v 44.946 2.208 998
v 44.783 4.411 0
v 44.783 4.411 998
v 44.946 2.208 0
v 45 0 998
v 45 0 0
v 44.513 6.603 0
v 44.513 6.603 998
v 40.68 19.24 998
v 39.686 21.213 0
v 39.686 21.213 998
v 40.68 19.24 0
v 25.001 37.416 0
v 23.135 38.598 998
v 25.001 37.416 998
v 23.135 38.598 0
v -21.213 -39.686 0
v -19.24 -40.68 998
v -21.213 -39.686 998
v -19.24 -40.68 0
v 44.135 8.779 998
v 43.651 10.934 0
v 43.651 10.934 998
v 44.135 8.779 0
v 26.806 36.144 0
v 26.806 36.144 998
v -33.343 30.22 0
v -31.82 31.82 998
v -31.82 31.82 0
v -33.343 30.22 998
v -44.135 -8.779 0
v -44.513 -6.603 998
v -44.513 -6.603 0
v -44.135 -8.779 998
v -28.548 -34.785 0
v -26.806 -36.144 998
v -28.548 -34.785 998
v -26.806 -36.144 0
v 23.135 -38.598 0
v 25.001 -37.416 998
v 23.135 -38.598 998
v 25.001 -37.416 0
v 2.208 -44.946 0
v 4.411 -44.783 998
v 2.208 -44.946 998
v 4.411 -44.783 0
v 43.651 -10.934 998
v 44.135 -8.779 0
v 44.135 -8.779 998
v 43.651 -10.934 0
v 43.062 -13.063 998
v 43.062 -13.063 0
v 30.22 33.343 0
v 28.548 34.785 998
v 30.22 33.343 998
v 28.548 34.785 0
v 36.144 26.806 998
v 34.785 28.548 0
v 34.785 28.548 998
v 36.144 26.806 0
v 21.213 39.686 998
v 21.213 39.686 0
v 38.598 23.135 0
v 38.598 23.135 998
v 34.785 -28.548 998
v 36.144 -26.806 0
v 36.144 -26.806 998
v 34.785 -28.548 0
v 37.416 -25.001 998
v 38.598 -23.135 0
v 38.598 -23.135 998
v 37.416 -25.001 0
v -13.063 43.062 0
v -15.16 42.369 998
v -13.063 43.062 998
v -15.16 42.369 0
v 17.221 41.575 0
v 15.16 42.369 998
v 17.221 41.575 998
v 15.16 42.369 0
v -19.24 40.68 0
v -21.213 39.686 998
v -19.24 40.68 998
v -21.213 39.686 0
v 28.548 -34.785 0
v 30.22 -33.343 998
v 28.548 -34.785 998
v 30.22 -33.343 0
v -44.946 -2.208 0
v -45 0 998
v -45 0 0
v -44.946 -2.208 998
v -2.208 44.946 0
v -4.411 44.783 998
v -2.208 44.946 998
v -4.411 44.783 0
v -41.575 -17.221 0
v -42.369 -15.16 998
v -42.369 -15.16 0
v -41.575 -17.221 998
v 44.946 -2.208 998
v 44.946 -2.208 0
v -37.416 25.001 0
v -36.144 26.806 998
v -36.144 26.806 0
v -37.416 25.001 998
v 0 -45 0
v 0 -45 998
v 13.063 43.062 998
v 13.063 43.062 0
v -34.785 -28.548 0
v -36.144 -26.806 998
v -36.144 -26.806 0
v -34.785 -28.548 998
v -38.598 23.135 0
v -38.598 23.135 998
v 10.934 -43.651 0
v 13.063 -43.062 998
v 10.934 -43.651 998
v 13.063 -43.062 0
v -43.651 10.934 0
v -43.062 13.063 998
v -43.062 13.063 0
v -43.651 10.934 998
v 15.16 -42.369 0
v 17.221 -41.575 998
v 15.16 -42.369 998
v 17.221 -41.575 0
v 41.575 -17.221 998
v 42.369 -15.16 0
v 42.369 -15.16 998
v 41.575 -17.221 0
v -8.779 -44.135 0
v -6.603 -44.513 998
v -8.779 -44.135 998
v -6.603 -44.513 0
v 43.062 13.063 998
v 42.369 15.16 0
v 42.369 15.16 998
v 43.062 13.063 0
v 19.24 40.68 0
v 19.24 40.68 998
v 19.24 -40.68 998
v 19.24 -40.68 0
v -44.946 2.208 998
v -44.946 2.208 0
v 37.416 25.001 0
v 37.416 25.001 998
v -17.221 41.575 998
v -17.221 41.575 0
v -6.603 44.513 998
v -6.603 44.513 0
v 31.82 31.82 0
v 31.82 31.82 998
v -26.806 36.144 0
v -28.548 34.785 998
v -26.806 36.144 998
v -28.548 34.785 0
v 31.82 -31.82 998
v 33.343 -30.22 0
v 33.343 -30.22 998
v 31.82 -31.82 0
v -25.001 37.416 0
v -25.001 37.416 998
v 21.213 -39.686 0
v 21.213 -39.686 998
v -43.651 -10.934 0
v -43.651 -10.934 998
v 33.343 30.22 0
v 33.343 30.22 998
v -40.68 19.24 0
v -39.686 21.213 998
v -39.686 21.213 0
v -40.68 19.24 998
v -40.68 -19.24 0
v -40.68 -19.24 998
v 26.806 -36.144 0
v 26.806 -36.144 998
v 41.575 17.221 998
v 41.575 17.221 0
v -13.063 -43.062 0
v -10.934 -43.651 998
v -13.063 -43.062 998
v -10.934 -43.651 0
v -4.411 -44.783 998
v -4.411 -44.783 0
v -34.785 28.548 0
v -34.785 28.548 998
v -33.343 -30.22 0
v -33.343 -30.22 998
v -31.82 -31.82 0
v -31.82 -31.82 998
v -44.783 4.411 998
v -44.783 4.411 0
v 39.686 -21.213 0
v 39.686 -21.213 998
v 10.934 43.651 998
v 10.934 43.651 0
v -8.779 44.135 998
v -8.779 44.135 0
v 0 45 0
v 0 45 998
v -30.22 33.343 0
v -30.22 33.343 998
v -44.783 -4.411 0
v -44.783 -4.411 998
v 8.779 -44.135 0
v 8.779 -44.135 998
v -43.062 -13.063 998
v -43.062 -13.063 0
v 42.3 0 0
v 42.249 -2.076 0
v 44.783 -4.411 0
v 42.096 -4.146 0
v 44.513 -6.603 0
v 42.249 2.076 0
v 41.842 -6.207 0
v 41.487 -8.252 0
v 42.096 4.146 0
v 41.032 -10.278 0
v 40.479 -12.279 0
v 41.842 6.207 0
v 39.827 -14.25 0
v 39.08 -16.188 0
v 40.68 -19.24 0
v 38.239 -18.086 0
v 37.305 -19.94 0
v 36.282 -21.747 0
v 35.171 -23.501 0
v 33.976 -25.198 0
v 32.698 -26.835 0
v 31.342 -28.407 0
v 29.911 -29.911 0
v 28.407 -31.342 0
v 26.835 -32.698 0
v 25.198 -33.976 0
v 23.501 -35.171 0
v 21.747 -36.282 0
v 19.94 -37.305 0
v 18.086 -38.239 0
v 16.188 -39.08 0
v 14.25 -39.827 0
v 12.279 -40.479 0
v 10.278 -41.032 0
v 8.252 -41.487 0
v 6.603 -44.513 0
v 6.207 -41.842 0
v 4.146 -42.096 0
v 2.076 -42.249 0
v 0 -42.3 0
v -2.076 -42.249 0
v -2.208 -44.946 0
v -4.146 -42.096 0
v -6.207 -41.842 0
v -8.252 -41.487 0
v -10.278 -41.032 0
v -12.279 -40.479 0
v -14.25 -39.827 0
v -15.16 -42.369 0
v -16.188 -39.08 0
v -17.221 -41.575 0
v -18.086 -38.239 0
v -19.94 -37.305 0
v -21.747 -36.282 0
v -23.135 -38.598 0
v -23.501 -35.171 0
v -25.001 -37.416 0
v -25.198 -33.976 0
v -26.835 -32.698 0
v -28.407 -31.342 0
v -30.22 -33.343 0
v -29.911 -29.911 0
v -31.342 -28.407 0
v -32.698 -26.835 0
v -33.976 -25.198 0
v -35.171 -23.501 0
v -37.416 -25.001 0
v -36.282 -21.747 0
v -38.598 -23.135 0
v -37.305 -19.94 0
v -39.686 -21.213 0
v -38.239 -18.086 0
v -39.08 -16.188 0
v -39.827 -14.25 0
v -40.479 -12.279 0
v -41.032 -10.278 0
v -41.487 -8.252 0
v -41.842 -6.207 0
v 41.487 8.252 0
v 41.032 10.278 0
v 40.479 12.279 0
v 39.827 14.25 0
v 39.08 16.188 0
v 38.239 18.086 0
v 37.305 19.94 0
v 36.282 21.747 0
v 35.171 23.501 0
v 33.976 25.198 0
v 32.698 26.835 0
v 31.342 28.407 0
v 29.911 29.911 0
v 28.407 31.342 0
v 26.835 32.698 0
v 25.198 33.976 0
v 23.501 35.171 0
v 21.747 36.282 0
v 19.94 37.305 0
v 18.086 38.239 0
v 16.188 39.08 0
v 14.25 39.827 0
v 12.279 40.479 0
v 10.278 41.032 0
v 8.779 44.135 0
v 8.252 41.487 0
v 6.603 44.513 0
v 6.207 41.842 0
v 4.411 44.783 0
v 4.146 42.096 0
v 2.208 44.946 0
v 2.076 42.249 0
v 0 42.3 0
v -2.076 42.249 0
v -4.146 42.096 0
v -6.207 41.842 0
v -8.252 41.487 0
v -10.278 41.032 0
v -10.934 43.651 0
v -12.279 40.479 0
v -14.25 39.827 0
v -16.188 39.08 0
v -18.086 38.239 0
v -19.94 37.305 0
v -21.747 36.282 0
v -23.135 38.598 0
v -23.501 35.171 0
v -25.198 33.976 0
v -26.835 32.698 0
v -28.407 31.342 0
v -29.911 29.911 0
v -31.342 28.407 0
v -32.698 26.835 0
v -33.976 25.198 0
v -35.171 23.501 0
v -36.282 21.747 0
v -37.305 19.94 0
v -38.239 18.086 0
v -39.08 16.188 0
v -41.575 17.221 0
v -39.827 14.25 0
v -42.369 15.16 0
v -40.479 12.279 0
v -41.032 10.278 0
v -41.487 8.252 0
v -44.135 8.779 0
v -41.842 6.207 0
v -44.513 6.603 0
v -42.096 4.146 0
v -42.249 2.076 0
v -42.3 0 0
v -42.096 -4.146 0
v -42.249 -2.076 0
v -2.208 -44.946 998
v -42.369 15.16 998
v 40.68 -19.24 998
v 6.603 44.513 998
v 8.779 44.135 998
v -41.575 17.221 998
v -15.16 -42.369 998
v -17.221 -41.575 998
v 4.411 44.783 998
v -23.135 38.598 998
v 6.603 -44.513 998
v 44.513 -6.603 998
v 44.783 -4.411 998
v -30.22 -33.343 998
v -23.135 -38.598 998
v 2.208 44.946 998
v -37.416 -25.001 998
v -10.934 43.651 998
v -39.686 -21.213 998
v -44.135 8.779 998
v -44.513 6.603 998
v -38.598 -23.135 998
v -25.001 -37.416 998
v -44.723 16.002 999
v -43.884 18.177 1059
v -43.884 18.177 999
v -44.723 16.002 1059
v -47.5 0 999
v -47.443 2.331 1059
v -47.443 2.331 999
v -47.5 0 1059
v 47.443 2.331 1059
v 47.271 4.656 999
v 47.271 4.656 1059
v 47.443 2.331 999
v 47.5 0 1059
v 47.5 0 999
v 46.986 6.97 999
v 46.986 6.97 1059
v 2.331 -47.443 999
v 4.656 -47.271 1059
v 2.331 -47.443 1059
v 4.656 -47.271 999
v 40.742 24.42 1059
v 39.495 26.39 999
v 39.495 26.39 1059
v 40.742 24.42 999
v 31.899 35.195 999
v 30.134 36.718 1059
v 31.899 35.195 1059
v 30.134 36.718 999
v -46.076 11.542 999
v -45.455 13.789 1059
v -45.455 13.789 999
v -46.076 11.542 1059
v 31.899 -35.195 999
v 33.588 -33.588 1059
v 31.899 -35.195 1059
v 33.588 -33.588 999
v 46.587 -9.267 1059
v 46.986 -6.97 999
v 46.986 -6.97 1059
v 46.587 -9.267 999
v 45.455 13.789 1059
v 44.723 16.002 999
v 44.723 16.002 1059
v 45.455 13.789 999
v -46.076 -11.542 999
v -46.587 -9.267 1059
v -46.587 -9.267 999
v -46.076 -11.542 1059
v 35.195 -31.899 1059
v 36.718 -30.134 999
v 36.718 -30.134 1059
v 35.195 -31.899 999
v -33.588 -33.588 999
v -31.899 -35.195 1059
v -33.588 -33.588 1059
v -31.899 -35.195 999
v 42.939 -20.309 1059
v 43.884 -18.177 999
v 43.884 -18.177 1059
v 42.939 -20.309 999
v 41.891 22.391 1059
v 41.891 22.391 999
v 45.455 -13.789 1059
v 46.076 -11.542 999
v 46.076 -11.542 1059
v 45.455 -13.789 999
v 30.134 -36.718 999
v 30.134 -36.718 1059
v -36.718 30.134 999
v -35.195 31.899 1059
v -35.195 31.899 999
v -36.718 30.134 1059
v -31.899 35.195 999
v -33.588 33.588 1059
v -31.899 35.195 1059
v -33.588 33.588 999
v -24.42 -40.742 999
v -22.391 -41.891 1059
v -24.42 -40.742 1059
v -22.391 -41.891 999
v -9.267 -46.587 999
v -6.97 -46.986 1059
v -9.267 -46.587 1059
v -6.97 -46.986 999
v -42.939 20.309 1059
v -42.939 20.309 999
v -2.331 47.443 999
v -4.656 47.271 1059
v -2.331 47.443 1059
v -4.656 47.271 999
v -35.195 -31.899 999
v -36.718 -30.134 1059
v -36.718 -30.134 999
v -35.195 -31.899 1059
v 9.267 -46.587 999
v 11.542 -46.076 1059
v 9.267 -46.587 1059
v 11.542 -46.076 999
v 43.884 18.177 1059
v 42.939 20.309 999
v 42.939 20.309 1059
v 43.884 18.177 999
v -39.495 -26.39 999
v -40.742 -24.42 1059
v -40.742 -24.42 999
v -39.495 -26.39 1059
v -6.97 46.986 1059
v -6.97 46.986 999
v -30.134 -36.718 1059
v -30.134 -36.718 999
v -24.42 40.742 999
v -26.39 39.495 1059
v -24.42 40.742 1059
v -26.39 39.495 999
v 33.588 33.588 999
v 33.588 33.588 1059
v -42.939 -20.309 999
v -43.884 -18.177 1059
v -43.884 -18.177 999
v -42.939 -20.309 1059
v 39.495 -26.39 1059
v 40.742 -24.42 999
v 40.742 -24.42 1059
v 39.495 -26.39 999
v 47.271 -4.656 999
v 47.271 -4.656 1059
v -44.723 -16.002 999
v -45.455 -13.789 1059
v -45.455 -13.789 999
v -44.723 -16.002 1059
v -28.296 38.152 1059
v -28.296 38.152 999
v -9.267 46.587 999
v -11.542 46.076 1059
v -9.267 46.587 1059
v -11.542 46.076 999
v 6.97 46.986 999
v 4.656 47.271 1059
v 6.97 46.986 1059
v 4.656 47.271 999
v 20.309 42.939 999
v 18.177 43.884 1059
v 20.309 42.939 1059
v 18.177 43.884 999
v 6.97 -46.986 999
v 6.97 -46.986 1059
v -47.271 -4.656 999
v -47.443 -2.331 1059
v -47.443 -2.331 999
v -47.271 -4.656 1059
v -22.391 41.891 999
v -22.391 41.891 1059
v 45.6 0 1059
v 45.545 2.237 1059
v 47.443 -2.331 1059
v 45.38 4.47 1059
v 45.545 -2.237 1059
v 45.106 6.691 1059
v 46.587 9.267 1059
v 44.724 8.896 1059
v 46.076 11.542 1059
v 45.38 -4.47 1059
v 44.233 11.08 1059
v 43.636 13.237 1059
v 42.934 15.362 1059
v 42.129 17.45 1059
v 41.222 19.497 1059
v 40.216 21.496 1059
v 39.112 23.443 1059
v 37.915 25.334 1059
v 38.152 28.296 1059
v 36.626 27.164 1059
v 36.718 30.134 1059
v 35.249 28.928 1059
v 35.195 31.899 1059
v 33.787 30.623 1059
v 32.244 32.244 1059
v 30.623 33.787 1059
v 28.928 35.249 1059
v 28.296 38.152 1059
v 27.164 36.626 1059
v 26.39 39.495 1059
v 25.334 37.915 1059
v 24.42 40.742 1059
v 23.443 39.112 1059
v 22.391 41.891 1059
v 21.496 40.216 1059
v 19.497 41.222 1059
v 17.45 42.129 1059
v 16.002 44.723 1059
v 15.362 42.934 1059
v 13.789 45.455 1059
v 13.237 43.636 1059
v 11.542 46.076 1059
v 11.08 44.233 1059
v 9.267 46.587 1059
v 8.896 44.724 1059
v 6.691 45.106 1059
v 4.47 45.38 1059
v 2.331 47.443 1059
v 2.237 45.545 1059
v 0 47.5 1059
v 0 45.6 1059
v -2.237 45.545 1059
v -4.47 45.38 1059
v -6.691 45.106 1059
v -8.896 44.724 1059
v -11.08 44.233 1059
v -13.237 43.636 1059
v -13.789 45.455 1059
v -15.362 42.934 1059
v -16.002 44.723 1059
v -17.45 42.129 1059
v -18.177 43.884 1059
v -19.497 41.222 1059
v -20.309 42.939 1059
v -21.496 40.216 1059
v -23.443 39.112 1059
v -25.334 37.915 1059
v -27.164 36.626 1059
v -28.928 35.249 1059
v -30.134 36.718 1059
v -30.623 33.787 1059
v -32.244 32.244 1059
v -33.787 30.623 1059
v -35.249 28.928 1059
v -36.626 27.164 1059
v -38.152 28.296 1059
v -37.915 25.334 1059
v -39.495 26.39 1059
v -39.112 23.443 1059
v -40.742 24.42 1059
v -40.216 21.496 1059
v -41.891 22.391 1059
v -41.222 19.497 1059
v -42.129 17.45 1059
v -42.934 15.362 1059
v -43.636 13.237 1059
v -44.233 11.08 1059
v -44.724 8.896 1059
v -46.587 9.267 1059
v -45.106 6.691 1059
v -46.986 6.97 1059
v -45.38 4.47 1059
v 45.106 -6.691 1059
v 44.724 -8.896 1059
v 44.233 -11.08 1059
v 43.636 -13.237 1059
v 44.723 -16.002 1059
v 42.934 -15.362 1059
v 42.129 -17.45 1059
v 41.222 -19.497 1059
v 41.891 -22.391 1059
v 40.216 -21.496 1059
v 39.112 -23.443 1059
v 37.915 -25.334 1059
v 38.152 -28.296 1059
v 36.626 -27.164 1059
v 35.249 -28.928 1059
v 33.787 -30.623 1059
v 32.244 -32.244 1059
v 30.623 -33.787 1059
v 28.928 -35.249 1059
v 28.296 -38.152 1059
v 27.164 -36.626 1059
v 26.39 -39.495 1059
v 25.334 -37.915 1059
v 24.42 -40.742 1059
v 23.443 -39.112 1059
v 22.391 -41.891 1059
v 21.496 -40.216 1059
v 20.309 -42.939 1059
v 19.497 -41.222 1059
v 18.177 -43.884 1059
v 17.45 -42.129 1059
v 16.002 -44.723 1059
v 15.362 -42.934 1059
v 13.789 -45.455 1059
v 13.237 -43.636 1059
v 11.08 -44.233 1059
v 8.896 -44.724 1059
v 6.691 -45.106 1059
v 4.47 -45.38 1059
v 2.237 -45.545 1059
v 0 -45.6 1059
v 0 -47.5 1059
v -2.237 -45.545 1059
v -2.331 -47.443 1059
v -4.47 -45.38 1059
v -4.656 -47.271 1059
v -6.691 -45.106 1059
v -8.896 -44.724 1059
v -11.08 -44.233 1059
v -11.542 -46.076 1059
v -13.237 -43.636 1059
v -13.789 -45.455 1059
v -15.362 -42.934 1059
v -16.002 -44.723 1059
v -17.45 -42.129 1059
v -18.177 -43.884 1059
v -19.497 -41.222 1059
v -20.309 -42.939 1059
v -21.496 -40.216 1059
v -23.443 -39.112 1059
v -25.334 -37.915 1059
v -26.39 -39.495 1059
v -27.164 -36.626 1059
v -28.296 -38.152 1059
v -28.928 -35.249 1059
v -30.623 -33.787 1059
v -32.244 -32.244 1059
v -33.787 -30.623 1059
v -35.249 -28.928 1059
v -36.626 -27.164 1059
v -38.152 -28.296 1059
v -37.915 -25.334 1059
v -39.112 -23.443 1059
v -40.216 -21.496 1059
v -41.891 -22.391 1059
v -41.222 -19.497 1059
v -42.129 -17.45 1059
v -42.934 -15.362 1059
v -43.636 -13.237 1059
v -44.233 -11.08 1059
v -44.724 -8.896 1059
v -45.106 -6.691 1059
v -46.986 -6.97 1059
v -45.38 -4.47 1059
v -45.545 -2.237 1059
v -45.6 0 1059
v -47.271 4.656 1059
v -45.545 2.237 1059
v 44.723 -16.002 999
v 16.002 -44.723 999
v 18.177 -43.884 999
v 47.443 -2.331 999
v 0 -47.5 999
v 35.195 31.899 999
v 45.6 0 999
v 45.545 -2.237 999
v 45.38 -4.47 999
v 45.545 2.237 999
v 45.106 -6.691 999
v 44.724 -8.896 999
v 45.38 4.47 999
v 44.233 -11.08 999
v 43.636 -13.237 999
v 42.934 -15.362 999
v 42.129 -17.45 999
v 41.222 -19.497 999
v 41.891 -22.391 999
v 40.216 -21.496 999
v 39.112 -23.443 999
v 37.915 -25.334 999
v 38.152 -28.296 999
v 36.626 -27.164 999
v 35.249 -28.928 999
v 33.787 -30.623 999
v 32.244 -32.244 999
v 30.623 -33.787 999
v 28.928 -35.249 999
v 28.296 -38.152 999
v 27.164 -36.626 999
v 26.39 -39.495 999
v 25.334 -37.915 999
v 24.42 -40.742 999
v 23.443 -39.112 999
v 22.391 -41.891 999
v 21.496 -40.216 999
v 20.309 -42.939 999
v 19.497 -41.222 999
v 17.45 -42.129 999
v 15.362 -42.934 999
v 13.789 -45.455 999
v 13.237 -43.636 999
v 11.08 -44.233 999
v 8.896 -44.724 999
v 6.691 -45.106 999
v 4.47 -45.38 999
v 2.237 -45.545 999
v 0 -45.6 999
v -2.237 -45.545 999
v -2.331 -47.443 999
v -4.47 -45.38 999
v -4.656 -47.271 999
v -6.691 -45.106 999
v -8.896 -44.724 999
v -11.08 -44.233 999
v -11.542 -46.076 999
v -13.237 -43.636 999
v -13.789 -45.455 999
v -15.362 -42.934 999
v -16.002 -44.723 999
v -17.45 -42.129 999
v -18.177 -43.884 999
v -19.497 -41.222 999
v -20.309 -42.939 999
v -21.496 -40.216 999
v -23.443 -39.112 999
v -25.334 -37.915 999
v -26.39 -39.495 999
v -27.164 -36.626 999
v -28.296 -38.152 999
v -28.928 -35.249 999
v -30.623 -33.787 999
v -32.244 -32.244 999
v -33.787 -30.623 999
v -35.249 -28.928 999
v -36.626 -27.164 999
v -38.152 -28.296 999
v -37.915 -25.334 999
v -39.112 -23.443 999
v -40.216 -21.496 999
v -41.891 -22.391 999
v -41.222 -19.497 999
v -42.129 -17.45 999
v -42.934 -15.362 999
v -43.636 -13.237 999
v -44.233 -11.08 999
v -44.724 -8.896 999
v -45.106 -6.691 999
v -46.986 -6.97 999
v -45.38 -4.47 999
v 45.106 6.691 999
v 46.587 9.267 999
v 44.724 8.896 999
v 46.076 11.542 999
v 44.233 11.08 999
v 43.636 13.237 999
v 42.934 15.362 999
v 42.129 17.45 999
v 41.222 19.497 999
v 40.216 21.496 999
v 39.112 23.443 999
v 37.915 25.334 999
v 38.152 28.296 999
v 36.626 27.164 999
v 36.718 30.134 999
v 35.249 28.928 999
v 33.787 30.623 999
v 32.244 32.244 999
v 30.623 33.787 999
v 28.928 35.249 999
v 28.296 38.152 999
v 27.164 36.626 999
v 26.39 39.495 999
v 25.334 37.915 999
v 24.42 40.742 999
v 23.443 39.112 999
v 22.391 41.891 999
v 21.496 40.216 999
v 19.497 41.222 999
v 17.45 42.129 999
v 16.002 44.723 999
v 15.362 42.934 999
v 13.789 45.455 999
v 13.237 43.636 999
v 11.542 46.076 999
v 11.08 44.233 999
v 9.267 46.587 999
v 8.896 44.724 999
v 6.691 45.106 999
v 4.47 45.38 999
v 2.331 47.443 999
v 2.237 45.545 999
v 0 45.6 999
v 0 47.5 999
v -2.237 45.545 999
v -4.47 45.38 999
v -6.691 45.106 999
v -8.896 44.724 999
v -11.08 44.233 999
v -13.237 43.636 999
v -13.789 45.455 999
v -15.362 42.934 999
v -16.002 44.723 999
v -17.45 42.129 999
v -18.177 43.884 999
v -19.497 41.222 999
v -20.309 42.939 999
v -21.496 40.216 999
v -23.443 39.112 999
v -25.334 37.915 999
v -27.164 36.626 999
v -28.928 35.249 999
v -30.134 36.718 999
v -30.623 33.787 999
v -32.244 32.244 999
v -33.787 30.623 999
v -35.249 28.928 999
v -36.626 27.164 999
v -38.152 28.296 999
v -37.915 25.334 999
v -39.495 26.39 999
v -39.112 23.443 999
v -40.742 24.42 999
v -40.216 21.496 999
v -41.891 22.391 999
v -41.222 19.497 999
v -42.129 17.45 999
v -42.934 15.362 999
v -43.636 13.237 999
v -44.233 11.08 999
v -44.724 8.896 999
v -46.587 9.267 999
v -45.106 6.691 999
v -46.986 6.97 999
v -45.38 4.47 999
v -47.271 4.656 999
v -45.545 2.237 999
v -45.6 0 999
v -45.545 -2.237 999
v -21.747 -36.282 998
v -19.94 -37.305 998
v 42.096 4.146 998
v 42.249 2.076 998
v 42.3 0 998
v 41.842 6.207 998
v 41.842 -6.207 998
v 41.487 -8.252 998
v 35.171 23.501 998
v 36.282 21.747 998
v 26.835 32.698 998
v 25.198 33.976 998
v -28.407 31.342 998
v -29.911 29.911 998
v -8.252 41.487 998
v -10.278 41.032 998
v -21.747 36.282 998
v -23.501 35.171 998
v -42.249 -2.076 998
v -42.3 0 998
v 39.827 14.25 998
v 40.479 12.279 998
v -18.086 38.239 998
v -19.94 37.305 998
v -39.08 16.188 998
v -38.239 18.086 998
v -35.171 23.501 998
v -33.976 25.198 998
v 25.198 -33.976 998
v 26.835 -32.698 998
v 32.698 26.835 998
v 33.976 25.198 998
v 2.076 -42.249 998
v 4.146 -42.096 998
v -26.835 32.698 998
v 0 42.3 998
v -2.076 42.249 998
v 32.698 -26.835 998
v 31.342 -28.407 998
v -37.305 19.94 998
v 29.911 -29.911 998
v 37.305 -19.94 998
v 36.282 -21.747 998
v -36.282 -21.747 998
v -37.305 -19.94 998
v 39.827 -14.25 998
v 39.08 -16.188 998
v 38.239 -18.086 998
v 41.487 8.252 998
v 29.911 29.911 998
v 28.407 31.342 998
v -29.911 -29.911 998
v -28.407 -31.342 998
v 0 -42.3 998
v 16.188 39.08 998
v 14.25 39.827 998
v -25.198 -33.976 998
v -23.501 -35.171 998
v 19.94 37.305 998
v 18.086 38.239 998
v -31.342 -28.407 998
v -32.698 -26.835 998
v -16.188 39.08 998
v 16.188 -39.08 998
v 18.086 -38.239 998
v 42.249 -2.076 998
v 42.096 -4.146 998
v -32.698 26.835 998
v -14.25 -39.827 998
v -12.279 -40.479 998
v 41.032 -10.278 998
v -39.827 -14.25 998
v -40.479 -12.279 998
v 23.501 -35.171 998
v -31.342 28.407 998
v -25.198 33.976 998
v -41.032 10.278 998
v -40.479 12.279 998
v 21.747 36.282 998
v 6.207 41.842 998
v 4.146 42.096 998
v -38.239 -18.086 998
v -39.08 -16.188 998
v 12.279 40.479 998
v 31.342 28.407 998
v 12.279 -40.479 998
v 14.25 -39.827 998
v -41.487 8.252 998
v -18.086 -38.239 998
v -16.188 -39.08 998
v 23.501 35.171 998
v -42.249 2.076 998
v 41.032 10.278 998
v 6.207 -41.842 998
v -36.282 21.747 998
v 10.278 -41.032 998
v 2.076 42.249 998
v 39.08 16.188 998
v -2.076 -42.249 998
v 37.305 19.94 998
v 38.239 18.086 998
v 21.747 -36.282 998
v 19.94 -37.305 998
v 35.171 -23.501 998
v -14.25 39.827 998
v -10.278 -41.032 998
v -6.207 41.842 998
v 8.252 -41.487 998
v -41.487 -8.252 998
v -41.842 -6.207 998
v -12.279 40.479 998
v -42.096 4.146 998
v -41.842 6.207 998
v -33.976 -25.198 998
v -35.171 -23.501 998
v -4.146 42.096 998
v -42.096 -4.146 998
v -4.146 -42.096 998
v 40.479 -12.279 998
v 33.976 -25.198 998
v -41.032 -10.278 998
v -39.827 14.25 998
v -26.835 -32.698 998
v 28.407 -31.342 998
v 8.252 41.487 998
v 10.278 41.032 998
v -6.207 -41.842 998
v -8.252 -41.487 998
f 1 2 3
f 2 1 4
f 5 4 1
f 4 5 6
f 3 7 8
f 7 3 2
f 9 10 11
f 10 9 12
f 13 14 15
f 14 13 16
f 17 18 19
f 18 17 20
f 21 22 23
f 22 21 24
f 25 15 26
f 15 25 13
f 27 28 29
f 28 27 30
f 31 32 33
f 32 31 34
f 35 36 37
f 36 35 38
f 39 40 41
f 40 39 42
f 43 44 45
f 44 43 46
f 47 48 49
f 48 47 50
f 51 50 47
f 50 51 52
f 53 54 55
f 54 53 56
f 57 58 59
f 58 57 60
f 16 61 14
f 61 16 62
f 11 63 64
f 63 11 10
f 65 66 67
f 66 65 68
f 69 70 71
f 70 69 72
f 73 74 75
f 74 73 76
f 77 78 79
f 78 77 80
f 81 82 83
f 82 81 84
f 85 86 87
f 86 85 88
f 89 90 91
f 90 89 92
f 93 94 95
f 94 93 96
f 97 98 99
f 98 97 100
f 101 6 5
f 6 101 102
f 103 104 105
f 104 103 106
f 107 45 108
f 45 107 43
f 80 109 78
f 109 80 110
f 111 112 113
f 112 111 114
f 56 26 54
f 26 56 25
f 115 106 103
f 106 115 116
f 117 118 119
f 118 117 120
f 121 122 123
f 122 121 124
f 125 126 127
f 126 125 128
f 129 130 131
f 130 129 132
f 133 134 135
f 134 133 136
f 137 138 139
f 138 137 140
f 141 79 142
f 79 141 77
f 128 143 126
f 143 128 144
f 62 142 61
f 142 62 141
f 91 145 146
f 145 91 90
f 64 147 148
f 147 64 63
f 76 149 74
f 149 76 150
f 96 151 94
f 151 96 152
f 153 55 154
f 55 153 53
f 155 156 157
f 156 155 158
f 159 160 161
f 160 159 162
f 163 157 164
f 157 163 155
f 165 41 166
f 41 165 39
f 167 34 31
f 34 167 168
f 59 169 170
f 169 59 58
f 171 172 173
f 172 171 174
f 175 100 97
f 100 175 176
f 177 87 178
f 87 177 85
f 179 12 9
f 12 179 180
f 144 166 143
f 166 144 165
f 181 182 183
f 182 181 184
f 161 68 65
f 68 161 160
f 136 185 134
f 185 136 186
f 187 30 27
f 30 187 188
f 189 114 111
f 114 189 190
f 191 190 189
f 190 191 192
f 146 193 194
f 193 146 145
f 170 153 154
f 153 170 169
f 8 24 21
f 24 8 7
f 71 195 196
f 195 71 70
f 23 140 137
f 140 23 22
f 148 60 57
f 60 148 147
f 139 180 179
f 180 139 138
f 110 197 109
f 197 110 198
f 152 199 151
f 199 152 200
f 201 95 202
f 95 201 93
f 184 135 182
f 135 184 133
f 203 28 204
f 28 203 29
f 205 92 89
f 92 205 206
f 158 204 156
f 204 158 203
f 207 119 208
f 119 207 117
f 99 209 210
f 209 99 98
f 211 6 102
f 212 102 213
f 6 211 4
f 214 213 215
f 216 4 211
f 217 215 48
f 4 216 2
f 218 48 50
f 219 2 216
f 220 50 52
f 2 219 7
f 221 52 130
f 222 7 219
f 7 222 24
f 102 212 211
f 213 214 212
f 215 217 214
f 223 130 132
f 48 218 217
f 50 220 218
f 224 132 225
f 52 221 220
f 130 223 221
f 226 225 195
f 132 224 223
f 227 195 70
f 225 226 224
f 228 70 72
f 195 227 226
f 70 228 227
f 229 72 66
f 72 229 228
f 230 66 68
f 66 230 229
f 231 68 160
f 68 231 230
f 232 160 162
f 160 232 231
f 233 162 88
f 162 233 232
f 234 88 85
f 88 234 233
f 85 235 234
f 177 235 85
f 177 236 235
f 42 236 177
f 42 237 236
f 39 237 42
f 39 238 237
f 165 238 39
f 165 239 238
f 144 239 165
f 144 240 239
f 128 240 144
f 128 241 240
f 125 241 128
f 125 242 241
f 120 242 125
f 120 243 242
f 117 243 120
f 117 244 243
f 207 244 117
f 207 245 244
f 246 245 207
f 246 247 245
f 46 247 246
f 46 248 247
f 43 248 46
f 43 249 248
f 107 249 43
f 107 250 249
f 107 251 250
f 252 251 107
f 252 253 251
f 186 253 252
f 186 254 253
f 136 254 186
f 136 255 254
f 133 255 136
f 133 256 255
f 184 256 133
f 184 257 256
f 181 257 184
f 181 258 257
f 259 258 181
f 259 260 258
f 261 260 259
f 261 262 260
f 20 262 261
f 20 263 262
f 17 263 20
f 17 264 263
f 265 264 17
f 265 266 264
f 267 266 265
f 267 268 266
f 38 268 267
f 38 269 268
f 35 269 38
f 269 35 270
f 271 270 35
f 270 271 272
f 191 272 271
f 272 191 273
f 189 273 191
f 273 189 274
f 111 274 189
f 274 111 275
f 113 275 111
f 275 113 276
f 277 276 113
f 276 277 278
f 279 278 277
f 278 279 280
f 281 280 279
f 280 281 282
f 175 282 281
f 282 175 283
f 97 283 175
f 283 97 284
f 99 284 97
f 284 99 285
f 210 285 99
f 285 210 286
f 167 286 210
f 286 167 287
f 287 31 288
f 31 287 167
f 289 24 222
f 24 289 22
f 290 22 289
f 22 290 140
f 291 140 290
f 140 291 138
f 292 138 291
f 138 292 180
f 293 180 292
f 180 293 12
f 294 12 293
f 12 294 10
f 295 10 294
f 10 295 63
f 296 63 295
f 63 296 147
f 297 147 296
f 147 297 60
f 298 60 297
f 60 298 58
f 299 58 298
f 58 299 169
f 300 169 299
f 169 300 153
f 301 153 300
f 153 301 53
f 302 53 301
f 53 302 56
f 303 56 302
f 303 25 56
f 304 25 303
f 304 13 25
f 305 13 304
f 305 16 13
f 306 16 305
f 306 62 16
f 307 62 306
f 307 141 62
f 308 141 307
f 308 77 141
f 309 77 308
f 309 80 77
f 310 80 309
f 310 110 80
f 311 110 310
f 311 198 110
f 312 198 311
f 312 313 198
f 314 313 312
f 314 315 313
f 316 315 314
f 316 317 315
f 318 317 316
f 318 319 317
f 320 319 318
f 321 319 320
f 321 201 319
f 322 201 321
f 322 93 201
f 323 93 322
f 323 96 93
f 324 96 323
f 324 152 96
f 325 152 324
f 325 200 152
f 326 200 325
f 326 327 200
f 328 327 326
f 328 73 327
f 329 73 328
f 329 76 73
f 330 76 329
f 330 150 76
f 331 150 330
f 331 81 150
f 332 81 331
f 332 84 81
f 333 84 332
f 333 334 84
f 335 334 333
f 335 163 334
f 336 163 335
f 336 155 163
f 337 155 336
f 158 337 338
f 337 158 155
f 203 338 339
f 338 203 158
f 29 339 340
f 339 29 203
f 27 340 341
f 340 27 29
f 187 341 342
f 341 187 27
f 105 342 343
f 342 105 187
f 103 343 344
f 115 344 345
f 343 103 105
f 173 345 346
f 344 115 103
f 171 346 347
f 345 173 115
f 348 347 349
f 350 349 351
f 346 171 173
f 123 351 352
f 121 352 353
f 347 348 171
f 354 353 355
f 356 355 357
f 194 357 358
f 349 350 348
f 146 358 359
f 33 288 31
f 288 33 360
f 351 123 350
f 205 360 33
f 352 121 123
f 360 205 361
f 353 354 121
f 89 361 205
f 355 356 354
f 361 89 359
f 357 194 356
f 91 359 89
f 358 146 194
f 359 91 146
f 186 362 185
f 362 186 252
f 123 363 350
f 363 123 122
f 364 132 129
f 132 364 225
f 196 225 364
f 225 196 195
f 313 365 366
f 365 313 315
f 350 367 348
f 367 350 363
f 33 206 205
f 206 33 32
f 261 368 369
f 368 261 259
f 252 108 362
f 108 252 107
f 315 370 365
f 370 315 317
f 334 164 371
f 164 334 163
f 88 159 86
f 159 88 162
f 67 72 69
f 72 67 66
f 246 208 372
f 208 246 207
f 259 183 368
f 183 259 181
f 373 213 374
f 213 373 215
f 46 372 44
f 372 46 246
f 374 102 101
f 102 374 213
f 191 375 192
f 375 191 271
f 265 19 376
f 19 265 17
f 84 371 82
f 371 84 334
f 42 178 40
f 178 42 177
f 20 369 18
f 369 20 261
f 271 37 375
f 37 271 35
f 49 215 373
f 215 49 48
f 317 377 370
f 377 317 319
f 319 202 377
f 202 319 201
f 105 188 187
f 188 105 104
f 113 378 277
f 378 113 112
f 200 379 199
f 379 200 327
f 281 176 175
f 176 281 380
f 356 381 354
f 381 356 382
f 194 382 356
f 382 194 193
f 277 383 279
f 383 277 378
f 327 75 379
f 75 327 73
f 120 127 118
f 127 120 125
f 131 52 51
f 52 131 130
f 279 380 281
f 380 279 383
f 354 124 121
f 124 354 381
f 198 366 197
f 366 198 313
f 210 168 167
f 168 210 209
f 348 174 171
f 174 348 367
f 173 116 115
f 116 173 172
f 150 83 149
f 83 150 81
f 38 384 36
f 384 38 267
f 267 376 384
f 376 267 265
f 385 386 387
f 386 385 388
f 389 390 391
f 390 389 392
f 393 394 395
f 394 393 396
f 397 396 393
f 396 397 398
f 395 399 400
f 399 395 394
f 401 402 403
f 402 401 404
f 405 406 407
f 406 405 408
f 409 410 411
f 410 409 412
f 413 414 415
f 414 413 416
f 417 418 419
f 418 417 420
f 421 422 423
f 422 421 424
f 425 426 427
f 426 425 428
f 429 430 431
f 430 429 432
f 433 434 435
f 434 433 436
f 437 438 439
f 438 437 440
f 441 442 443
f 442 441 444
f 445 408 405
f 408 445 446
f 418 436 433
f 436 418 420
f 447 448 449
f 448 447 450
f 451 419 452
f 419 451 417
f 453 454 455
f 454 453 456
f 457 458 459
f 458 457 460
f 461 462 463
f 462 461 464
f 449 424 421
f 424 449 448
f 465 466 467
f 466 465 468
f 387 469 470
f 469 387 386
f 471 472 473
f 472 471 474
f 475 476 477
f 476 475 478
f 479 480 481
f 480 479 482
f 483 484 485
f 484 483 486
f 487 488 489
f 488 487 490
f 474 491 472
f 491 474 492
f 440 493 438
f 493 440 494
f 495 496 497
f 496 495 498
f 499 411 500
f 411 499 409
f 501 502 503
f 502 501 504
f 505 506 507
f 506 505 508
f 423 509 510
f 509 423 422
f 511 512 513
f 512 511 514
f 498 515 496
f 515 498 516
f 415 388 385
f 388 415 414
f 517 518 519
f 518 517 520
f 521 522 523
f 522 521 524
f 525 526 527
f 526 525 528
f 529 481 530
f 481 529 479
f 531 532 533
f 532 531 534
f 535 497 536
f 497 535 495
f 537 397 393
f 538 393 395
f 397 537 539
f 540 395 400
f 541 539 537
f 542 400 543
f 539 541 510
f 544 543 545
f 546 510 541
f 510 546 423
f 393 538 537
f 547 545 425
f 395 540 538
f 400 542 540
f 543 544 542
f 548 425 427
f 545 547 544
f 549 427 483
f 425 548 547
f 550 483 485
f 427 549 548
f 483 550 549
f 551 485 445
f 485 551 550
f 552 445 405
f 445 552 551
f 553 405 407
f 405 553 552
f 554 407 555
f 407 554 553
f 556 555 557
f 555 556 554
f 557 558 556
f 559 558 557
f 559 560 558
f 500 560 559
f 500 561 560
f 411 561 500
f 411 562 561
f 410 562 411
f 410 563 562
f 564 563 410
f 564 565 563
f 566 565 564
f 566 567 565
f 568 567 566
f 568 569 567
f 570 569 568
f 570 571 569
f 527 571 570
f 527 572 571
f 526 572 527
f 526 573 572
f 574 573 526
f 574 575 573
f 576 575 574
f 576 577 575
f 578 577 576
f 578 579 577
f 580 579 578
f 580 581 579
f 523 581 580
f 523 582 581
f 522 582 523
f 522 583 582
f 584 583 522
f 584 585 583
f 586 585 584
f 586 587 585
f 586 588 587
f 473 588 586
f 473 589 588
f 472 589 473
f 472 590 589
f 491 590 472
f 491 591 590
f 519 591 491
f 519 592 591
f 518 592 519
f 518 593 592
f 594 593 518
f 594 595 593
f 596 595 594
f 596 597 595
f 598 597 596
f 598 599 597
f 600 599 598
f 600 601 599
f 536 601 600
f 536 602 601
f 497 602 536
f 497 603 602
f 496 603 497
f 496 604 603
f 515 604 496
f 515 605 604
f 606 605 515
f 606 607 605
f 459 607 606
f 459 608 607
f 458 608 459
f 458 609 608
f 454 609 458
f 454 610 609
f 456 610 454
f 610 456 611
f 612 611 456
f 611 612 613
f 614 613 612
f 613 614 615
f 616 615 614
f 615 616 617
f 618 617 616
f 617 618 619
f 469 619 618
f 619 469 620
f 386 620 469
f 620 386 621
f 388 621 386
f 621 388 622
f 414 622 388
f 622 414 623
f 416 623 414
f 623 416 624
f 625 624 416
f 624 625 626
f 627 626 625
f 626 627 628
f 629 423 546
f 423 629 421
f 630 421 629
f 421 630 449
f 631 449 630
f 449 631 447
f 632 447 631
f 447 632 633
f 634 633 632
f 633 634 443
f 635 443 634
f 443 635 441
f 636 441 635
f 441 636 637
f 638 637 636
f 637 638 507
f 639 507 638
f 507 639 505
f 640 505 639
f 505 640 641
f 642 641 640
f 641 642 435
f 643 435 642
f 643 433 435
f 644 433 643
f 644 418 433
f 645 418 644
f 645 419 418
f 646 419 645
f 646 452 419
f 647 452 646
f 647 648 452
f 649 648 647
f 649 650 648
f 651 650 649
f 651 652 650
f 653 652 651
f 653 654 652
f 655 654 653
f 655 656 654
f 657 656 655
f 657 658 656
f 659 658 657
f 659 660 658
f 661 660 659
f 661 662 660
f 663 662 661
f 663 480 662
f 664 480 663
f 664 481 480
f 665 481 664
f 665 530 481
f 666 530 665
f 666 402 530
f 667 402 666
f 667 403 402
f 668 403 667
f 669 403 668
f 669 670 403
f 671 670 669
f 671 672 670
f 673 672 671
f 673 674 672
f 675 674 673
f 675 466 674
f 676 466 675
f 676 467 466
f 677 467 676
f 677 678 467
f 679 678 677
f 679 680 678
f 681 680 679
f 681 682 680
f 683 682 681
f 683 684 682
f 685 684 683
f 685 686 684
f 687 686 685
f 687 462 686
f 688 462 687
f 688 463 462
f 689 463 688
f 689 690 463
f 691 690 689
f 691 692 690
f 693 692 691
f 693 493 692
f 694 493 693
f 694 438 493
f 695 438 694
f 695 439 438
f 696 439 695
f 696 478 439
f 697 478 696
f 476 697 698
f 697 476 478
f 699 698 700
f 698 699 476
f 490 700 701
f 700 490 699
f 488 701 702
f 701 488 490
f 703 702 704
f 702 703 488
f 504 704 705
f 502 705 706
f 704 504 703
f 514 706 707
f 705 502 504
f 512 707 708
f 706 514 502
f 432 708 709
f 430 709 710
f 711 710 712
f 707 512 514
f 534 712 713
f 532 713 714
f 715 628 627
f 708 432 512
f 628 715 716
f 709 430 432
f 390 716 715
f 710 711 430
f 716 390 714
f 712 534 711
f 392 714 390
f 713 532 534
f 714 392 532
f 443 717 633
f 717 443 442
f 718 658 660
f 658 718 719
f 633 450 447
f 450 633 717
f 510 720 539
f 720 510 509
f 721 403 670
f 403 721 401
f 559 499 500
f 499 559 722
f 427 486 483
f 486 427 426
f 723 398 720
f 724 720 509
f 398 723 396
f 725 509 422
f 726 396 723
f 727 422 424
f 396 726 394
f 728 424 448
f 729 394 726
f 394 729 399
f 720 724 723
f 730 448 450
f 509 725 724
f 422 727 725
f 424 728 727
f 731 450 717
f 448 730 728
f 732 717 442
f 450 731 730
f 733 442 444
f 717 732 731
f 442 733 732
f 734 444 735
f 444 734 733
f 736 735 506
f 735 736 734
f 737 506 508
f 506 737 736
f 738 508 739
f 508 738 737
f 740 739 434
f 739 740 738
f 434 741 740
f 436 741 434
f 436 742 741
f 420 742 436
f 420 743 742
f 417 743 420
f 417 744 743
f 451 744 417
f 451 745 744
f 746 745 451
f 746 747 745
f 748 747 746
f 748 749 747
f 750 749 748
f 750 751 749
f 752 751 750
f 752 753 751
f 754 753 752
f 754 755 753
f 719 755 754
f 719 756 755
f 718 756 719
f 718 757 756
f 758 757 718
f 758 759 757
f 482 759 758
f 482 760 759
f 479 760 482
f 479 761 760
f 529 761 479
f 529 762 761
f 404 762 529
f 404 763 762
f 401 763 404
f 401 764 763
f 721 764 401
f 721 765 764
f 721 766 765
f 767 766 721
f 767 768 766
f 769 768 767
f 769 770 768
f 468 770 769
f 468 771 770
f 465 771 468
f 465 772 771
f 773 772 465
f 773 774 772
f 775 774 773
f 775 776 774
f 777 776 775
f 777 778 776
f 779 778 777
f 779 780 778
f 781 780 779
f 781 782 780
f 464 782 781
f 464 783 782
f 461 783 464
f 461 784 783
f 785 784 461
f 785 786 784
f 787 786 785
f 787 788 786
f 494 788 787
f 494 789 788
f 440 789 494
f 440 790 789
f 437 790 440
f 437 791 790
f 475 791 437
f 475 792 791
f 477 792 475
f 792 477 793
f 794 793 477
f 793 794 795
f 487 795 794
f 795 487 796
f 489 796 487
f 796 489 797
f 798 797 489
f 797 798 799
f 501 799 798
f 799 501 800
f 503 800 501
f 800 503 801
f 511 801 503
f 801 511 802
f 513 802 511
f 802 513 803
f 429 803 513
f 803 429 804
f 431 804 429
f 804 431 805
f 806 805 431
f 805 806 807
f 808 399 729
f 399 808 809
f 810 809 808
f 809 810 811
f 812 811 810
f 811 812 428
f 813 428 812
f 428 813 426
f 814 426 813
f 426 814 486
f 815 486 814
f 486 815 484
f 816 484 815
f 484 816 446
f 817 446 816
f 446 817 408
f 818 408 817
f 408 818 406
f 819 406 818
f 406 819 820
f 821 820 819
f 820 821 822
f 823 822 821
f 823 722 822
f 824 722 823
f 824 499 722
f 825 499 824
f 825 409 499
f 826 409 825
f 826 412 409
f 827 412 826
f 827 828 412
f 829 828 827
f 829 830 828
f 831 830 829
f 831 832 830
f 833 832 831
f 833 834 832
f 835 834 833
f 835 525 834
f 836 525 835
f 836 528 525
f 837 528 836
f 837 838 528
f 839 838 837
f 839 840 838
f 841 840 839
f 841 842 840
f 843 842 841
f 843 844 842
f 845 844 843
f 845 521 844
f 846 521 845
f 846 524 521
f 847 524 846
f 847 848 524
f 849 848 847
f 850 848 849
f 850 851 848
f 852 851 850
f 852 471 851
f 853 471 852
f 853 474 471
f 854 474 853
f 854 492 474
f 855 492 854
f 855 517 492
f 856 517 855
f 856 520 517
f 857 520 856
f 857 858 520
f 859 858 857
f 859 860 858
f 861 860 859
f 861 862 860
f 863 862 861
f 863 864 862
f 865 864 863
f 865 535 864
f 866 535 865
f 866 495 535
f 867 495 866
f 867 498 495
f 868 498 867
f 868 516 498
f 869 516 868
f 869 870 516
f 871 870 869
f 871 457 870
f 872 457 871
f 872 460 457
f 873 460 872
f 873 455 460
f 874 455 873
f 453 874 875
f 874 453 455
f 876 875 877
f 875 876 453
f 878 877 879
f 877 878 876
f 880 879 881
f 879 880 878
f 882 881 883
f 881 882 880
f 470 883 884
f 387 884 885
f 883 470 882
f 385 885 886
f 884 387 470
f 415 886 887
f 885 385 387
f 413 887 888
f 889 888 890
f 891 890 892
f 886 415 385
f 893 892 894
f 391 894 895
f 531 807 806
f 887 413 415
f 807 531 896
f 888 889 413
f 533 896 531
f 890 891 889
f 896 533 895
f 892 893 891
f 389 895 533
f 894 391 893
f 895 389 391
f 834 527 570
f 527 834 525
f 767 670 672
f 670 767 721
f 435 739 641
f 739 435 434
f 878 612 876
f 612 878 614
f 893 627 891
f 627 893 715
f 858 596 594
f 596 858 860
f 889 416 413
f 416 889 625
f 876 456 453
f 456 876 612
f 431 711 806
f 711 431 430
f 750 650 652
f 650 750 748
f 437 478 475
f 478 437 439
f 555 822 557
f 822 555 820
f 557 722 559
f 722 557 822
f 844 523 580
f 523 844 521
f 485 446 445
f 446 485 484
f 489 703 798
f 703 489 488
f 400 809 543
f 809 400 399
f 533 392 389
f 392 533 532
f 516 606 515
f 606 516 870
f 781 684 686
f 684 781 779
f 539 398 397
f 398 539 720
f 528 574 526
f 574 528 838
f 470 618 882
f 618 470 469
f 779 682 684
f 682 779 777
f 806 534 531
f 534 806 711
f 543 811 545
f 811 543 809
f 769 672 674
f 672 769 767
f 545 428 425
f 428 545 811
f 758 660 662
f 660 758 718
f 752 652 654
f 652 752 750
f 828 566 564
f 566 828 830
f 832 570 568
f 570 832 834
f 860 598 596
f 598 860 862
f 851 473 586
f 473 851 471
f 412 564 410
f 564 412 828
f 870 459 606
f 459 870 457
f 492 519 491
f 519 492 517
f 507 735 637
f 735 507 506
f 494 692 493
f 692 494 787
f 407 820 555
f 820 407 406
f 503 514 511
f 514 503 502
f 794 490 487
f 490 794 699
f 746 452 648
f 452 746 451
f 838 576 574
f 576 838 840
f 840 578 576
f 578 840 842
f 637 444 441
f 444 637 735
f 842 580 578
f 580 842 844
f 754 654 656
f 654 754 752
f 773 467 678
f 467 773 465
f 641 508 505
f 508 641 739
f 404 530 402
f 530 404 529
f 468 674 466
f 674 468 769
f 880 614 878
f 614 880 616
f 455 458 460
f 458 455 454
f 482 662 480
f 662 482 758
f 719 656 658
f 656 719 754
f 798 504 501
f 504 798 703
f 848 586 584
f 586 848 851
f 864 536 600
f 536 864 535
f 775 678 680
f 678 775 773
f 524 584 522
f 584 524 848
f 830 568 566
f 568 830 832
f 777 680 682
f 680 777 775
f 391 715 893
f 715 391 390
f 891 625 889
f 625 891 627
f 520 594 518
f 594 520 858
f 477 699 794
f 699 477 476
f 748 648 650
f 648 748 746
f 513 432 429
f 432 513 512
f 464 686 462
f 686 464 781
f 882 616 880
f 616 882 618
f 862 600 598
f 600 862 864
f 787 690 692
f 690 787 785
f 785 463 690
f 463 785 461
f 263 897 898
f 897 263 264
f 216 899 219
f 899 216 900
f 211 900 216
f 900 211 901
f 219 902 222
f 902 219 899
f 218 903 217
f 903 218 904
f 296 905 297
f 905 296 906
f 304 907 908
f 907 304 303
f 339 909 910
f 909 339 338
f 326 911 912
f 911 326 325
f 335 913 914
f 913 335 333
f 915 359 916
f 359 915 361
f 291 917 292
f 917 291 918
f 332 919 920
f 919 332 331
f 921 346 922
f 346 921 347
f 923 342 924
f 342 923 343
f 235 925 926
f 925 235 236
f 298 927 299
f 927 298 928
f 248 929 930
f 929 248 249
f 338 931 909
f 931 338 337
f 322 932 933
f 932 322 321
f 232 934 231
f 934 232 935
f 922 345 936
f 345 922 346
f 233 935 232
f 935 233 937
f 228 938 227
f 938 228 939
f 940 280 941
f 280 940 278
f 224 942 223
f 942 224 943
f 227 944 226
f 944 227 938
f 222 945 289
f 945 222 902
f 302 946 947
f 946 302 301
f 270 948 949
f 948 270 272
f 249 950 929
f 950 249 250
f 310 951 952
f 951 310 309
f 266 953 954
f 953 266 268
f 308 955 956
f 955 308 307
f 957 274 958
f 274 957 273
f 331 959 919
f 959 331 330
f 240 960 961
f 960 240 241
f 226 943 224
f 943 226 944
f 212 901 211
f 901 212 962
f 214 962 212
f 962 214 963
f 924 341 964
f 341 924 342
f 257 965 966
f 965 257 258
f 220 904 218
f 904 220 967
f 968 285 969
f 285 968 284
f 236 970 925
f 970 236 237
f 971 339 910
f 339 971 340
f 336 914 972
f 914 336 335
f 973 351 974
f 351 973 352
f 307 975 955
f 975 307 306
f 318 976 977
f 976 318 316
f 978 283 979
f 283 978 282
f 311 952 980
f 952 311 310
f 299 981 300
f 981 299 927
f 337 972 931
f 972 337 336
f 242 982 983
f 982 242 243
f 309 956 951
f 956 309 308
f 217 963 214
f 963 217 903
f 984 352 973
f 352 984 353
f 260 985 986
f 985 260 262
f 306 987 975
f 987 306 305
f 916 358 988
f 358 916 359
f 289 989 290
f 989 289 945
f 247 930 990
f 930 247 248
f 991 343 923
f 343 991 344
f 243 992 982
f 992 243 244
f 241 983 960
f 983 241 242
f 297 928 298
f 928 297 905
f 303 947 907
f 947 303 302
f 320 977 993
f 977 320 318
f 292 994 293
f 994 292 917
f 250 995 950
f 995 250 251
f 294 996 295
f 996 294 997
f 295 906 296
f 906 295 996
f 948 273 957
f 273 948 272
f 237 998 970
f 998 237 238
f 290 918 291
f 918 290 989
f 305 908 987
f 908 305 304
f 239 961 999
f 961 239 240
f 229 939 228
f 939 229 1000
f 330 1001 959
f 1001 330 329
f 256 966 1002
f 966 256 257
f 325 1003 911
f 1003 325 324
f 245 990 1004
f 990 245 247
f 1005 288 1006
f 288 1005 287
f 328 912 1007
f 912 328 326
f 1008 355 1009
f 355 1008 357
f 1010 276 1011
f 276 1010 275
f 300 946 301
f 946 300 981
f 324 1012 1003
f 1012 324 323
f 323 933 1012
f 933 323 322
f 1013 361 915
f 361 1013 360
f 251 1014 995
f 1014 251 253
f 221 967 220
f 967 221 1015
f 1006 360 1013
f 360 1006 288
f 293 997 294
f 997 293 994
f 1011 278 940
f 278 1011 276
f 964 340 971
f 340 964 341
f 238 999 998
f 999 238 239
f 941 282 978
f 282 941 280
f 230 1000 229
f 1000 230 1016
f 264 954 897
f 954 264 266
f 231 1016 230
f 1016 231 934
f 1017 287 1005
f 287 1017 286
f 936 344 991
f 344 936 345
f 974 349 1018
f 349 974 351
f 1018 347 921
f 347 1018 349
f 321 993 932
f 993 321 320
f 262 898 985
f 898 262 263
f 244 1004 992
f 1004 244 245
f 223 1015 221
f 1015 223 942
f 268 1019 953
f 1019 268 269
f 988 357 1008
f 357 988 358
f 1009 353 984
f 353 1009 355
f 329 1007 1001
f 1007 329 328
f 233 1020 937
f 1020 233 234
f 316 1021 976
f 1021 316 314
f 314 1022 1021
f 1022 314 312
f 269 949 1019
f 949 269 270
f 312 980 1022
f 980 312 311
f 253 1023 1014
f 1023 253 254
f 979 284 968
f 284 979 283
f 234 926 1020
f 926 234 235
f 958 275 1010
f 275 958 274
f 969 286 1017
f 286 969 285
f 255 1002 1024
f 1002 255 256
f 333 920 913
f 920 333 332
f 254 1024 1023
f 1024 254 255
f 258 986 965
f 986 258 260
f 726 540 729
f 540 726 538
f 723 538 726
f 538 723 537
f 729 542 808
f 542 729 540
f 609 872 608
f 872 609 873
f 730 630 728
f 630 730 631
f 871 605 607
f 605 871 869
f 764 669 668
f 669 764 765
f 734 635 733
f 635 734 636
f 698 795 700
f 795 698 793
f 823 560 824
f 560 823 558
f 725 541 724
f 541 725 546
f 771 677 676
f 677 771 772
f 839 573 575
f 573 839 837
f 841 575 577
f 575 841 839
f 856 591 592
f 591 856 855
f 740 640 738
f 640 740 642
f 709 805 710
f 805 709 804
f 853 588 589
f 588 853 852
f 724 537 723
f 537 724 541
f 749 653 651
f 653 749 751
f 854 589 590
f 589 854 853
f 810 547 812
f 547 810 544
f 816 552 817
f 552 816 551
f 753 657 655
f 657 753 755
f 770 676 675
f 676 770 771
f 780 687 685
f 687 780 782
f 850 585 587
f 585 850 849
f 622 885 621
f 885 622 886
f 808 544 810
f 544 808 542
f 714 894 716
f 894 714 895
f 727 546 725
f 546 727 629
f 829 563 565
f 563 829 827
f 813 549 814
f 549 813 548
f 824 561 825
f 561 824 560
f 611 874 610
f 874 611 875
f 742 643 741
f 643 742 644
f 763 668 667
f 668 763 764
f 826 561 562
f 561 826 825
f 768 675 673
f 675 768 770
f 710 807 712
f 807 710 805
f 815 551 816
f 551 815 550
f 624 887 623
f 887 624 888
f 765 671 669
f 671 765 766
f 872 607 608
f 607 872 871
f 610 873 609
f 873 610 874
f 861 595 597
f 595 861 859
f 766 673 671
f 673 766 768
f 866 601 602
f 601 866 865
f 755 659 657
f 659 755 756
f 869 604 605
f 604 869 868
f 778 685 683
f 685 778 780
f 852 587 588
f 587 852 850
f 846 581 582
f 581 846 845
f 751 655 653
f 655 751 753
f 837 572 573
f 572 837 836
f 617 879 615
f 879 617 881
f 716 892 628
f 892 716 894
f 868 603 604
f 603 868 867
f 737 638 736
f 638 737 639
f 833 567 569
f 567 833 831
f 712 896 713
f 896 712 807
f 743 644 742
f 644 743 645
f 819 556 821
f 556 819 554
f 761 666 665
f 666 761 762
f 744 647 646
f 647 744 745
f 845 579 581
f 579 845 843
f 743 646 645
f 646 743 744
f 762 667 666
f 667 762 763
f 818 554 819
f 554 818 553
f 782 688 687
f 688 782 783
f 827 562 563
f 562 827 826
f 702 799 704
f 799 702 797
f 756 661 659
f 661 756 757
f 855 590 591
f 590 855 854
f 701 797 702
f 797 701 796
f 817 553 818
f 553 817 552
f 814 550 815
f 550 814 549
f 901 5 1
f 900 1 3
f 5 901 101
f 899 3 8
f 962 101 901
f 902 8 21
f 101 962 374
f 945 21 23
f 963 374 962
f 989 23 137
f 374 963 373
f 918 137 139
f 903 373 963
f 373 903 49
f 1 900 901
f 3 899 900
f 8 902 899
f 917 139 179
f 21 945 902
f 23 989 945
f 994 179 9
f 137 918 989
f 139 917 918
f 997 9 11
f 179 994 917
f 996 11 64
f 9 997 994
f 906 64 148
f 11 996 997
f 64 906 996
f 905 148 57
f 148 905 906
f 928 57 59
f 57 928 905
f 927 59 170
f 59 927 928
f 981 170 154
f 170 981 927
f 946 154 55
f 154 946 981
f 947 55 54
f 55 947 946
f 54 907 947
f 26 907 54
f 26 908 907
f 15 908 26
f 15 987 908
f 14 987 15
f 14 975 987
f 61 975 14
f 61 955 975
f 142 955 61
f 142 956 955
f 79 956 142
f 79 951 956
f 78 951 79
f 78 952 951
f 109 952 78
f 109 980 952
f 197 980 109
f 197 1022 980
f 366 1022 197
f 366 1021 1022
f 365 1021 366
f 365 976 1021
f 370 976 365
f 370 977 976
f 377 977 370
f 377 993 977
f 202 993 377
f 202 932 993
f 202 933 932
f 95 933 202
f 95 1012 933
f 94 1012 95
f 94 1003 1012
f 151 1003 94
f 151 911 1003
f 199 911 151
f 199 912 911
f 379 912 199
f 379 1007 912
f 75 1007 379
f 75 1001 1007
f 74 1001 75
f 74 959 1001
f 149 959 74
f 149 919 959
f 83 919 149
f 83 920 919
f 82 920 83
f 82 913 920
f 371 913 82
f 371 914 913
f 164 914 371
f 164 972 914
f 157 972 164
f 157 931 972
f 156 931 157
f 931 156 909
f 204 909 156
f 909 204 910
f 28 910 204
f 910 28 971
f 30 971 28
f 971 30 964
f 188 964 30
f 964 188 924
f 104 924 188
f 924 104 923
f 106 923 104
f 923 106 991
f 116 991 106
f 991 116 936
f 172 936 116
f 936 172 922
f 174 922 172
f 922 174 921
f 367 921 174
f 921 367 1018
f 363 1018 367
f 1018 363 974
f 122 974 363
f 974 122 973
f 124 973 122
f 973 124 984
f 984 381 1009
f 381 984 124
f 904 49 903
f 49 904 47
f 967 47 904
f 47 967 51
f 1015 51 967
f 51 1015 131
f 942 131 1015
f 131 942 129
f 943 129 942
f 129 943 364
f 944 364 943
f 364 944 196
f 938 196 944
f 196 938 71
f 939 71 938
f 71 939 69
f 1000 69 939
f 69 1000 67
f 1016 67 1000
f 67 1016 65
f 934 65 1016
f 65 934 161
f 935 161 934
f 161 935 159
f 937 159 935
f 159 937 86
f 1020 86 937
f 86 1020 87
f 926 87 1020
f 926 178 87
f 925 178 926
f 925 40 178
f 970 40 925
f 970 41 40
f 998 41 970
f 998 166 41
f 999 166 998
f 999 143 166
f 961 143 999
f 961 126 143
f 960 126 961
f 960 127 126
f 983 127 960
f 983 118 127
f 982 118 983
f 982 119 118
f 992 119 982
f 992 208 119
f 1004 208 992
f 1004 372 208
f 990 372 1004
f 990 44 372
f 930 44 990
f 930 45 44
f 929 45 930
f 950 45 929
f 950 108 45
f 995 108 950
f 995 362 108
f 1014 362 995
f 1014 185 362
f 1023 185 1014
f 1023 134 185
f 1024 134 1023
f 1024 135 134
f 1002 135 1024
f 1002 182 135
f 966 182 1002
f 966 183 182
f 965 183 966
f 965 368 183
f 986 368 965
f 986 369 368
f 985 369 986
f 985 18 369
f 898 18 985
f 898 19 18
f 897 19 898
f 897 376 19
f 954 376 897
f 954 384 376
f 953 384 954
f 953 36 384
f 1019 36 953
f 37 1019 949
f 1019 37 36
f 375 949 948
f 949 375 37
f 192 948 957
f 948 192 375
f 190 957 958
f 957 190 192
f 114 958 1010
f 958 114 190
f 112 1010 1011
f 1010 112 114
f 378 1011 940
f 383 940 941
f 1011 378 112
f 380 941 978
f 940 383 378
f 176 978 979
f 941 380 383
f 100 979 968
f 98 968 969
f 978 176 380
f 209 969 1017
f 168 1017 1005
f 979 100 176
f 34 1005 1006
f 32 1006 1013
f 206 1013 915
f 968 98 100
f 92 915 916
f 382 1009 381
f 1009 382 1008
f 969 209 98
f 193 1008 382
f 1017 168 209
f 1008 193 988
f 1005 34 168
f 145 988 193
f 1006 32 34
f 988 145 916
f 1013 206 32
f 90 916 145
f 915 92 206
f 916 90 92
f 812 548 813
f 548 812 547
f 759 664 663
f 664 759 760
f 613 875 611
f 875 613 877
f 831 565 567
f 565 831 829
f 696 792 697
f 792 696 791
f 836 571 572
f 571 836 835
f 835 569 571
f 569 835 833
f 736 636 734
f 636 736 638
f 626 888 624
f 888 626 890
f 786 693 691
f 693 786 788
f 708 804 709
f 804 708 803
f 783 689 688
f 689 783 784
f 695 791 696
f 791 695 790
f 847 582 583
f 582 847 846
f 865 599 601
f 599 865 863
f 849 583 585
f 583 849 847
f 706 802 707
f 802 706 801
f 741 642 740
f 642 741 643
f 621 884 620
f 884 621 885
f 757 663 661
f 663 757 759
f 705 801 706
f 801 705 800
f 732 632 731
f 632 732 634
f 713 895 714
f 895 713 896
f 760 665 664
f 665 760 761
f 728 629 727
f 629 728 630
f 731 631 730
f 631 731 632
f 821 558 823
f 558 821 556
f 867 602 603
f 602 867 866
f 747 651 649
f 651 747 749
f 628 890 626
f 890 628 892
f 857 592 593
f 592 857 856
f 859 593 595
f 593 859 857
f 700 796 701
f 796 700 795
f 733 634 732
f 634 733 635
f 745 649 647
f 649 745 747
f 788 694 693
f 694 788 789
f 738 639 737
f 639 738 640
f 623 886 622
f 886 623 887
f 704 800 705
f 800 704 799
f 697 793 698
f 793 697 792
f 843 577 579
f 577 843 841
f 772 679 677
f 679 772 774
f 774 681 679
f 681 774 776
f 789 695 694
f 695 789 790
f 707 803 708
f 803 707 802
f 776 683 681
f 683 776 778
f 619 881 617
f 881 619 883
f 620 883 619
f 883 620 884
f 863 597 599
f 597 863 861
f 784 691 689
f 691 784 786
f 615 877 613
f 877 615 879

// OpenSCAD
$fn = 128;

// Parameters
nominal_diameter = 90; //[50:180:1]
length_mm = 1000; //[500:2000:10]
include_end_fitting = 1; //[0:1:1]
center = 0; //[0:1:1]
pipe_od = 90; //[50:180:1]
pipe_wall = 2.7; //[1.5:6:0.1]
socket_length = 60; //[30:120:1]
socket_wall_extra = 2.5; //[1:6:0.1]
socket_bore_clearance = 0.6; //[0.2:1.5:0.1]
overlap = 1; //[0.5:2:0.1]

module ht_pipe() {
  // Derived radii
  pipe_or = pipe_od/2;
  pipe_ir = pipe_or - pipe_wall;

  socket_or = pipe_or + socket_wall_extra;
  socket_ir = pipe_or + socket_bore_clearance;

  // Safety clamps to avoid invalid geometry
  pipe_ir_safe   = max(0.01, pipe_ir);
  socket_ir_safe = max(0.01, min(socket_ir, socket_or - 0.01));

  // Ensure overlap is valid
  overlap_safe = max(0.01, min(overlap, socket_length - 0.01));

  // Z placement
  z0 = center ? -length_mm/2 : 0;
  z_pipe_start = z0;
  z_pipe_end   = z0 + length_mm;

  // Socket starts at pipe end and overlaps into pipe by "overlap_safe"
  z_socket_start = z_pipe_end - overlap_safe;
  z_socket_end   = z_socket_start + socket_length;

  // One connected solid: outer union minus inner voids
  color([0.85, 0.85, 0.8])
  difference() {
    // OUTER SOLID
    union() {
      // Main pipe outer
      translate([0, 0, z_pipe_start])
        cylinder(h=length_mm, r=pipe_or, center=false);

      // Socket outer (connected via overlap)
      if (include_end_fitting)
        translate([0, 0, z_socket_start])
          cylinder(h=socket_length, r=socket_or, center=false);
    }

    // INNER VOIDS (subtracted)
    // Main pipe inner bore (extend slightly to avoid coplanar faces)
    translate([0, 0, z_pipe_start - overlap_safe])
      cylinder(h=length_mm + 2*overlap_safe, r=pipe_ir_safe, center=false);

    // Socket inner bore (only where socket exists)
    if (include_end_fitting)
      translate([0, 0, z_socket_start - overlap_safe])
        cylinder(h=socket_length + 2*overlap_safe, r=socket_ir_safe, center=false);
  }
}

ht_pipe();
